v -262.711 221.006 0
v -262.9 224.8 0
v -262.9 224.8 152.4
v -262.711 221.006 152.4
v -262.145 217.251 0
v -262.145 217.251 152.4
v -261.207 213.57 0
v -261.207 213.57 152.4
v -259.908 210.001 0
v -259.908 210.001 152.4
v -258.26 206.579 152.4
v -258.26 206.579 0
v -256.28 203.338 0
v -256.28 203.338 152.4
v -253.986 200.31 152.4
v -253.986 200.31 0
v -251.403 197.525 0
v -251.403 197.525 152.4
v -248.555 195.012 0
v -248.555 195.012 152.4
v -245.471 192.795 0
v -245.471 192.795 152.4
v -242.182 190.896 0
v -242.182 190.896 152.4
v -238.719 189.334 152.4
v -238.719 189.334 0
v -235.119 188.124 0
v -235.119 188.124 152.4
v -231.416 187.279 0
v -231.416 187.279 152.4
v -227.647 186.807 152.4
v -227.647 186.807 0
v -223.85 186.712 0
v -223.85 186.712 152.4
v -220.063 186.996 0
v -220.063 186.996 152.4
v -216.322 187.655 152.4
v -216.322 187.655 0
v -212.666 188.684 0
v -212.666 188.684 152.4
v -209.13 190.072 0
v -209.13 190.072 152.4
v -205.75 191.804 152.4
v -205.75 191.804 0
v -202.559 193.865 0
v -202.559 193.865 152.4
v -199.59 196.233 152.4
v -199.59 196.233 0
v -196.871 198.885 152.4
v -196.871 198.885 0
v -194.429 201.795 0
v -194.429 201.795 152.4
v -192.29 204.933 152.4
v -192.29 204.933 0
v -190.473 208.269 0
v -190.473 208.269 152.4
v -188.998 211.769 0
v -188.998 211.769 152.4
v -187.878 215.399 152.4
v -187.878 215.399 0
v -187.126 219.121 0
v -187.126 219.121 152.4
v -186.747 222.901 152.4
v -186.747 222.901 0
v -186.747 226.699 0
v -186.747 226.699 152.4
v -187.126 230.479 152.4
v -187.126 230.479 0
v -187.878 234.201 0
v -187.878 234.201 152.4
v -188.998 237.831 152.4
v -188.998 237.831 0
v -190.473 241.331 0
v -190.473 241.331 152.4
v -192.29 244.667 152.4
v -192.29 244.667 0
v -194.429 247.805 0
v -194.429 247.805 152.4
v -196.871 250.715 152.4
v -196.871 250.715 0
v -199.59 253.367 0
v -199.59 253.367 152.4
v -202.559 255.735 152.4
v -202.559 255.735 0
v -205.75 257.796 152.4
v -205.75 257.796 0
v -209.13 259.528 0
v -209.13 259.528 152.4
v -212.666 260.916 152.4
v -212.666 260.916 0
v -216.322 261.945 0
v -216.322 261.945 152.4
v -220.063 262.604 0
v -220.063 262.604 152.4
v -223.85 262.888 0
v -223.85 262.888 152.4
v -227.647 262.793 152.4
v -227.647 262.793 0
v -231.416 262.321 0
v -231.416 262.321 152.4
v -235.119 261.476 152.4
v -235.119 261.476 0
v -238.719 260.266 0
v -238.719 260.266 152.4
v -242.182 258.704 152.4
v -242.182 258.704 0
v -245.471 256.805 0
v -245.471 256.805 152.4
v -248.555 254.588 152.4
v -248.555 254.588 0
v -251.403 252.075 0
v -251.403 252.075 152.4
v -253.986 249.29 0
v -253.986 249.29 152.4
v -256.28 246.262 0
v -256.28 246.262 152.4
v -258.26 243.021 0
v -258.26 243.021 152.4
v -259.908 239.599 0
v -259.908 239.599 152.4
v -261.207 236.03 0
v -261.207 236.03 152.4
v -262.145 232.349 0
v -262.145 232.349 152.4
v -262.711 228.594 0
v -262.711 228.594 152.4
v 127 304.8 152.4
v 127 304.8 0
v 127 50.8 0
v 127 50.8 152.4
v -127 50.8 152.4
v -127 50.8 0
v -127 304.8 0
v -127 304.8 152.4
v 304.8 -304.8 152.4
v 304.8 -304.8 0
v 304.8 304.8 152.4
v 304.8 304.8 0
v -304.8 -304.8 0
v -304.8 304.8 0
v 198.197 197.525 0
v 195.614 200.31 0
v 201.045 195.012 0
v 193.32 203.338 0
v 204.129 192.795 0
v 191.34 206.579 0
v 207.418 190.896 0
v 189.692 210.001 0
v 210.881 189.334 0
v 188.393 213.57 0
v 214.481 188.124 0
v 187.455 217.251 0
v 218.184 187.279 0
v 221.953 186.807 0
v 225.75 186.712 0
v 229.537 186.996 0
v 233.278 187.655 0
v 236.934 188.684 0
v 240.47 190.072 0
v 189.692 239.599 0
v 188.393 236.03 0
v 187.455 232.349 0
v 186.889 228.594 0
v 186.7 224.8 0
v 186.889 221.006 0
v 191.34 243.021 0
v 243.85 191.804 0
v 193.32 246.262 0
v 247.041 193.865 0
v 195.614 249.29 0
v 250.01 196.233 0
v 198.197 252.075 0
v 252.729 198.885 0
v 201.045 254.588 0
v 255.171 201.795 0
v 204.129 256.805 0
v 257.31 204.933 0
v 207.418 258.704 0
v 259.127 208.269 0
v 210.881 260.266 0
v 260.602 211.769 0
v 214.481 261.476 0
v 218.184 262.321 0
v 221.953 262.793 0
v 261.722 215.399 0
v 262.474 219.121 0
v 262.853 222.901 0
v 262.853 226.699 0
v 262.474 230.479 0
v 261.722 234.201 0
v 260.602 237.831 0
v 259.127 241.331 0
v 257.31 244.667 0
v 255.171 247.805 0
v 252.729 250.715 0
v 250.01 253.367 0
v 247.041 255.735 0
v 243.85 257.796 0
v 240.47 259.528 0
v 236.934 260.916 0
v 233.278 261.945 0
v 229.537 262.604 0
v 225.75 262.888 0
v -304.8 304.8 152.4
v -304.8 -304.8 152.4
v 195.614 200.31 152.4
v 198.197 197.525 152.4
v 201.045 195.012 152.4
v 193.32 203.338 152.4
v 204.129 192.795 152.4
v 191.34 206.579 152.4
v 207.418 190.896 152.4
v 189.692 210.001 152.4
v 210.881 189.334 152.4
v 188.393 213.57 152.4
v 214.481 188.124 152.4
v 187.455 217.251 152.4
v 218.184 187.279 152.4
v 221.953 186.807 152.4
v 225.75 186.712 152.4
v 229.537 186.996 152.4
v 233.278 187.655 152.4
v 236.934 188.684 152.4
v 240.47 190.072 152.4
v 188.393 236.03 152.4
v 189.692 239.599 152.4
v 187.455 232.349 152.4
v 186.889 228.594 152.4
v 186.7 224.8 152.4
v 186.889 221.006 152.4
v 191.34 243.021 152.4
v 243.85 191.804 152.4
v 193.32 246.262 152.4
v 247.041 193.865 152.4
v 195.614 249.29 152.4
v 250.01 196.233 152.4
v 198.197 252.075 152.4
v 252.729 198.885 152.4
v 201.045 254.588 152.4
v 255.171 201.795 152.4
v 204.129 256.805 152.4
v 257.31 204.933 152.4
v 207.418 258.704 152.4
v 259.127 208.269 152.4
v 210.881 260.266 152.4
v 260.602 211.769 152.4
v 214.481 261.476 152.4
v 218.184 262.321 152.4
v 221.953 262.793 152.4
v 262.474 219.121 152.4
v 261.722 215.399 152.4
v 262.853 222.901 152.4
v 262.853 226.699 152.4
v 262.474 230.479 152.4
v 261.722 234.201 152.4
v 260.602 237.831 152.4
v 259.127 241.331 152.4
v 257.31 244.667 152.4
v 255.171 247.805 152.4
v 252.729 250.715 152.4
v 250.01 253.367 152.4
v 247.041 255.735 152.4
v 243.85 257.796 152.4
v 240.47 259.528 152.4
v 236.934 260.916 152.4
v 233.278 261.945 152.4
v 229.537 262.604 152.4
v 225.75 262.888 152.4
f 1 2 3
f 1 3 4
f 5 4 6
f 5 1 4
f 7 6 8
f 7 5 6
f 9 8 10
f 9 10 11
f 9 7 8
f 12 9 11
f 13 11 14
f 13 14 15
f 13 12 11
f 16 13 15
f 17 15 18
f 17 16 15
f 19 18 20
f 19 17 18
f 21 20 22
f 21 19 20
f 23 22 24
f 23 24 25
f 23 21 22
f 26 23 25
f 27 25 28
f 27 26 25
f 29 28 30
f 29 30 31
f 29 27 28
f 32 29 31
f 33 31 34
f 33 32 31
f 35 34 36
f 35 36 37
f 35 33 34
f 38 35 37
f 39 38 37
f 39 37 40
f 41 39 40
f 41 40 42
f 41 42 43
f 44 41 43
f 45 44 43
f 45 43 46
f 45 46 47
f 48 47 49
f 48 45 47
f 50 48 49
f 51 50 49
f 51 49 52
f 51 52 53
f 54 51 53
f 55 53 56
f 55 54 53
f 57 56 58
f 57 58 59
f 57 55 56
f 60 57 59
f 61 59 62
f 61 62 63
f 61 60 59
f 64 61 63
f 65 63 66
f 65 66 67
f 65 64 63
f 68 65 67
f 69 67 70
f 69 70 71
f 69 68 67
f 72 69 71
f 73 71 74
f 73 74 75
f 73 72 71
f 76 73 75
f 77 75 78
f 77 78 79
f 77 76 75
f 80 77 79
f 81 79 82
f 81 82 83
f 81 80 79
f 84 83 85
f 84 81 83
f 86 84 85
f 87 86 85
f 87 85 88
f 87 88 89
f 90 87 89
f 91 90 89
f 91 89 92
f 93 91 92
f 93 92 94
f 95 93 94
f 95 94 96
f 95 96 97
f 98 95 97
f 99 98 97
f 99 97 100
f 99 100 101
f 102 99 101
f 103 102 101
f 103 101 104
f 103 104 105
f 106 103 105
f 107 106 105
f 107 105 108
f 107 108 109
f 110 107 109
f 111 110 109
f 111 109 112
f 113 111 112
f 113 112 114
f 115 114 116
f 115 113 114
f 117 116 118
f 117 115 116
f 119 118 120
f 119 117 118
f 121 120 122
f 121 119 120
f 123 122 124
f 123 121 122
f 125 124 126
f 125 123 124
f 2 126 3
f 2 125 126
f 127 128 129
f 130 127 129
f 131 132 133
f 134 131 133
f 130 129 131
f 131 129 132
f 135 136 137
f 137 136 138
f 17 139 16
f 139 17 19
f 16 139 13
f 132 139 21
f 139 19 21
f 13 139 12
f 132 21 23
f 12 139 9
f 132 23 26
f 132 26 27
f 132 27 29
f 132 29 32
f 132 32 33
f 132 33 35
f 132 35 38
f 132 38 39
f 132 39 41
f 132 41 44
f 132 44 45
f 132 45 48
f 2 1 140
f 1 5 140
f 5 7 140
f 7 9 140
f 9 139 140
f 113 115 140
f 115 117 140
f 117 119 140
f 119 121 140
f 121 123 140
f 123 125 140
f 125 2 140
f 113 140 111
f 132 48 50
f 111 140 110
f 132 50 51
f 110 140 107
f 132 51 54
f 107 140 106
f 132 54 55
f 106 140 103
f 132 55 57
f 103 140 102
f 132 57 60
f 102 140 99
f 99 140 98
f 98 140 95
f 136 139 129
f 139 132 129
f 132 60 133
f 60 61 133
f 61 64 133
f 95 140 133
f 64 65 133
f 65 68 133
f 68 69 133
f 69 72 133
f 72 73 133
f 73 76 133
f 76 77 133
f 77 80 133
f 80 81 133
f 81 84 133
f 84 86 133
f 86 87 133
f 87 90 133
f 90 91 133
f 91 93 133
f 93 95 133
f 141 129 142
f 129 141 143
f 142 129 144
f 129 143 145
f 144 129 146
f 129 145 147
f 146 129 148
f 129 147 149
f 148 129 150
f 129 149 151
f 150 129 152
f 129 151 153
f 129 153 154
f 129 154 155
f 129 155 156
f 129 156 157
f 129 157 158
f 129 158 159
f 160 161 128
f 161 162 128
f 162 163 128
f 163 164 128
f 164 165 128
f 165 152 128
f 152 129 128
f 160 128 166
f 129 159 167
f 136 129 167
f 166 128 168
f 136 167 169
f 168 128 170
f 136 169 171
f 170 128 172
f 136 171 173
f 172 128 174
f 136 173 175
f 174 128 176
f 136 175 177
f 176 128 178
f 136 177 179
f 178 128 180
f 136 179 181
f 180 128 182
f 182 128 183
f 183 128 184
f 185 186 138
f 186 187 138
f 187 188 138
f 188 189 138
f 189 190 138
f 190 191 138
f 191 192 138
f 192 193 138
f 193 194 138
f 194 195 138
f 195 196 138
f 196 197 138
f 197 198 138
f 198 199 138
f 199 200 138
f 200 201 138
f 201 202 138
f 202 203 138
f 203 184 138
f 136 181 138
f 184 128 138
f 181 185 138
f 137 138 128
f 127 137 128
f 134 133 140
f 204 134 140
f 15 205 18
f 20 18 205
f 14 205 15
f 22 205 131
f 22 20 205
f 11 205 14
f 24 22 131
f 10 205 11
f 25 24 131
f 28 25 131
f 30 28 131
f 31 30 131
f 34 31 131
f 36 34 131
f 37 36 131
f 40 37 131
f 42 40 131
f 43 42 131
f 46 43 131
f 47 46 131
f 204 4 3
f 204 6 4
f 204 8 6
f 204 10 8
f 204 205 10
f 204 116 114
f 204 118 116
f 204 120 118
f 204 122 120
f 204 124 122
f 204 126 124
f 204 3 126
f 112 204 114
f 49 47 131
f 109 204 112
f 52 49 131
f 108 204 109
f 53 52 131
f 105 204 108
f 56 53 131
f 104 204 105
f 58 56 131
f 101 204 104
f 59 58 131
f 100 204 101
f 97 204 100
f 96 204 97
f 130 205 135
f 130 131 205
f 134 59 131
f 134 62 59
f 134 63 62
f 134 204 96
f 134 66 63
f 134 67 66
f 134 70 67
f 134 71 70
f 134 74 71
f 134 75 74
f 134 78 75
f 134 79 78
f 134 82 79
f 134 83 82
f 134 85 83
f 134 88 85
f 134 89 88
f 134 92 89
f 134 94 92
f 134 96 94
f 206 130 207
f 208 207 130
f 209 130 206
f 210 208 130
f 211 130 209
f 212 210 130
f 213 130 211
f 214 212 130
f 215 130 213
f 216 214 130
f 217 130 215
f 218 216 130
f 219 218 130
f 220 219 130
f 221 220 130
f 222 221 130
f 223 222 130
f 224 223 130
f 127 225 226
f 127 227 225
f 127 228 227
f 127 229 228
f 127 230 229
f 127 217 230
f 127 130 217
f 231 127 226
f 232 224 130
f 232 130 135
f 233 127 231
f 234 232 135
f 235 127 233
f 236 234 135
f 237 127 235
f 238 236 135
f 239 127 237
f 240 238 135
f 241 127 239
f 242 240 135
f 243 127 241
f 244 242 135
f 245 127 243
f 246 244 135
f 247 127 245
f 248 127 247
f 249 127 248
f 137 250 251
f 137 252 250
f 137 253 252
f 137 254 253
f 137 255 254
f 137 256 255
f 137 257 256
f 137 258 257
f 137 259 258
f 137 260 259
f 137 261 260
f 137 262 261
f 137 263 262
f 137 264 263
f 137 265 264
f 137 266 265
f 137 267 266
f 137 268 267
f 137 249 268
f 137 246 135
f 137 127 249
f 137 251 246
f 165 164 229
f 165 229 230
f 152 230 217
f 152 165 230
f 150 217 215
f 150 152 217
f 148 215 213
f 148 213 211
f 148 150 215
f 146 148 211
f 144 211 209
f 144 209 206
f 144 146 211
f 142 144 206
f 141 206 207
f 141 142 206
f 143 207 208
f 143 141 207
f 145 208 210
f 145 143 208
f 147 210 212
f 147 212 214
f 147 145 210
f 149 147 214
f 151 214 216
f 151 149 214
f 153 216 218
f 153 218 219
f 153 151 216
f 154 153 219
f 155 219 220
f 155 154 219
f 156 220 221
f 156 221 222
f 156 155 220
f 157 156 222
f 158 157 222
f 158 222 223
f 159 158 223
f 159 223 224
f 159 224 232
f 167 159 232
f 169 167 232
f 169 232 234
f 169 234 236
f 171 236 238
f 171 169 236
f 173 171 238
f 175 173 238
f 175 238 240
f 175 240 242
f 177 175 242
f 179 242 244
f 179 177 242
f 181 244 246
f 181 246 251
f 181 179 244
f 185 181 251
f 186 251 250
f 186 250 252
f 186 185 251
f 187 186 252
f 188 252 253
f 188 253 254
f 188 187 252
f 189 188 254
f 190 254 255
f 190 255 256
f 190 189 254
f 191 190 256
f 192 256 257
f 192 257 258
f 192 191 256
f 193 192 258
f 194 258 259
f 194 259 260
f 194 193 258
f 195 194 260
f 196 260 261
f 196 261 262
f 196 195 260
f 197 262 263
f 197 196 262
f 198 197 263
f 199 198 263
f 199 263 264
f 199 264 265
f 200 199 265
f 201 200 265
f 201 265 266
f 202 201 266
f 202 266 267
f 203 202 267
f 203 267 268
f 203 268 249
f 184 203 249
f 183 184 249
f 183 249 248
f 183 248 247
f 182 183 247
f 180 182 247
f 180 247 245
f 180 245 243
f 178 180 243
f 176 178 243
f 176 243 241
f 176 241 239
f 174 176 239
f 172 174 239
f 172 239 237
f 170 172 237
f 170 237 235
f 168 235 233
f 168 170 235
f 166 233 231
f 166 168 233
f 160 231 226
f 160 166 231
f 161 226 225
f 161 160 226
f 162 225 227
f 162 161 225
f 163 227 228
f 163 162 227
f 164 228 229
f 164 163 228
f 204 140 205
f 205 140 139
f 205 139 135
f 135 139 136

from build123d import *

# Parameters (mm, degrees)
SKETCH1_R           = 38.1
BOSS_EXTRUDE1_DEPTH = 152.4


with BuildPart() as part:
    # Sketch1 → Boss-Extrude1 (new body)
    with BuildSketch(Plane.XY):
        Polygon((304.8, -304.8), (304.8, 304.8), (127, 304.8), (127, 50.8), (-127, 50.8), (-127, 304.8), (-304.8, 304.8), (-304.8, -304.8), align=None)
        with Locations(Location((-224.8, 224.8, 0), (0, 0, 180))):
            Circle(SKETCH1_R, mode=Mode.SUBTRACT)
        with Locations(Location((224.8, 224.8, 0), (0, 0, 180))):
            Circle(SKETCH1_R, mode=Mode.SUBTRACT)
    extrude(amount=BOSS_EXTRUDE1_DEPTH)


solid = part.part
